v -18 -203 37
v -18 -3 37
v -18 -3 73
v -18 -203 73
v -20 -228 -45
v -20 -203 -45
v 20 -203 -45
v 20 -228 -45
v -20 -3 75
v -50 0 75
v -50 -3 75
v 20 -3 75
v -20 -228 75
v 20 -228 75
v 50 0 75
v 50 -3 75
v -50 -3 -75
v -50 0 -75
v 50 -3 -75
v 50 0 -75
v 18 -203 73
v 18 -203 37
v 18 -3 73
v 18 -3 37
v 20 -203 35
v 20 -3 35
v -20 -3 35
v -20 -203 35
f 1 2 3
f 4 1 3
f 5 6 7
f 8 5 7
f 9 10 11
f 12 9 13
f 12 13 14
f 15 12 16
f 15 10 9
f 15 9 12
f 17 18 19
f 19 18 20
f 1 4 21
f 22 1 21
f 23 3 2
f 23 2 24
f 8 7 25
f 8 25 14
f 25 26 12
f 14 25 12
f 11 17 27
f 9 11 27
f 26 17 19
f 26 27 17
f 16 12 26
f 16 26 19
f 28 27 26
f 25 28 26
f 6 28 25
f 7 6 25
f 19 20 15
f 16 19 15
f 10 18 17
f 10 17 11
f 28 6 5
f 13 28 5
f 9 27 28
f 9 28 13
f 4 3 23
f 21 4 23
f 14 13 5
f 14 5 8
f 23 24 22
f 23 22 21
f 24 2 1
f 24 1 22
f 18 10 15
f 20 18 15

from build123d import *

# Parameters (mm, degrees)
F0_W     = 100
F0_H     = 150
F1_DEPTH = 3
F2_W     = 36
F2_H     = 36
F3_DEPTH = 200
F4_W     = 40
F4_H     = 120
F5_DEPTH = 25


with BuildPart() as f1:
    # F0 (on Front) → F1 (new body)
    with BuildSketch(Plane.XZ):
        Rectangle(F0_W, F0_H)
    extrude(amount=F1_DEPTH)

    # F2 (on face) → F3 (join)
    with BuildSketch(Plane.XZ.offset(3)):
        Polygon((20, 75), (0, 75), (-20, 75), (-20, 35), (20, 35), align=None)
        with Locations((0, 55)):
            Rectangle(F2_W, F2_H, mode=Mode.SUBTRACT)
    extrude(amount=F3_DEPTH)

    # F4 (on face) → F5 (join)
    with BuildSketch(Plane.XZ.offset(203)):
        with Locations((0, 15)):
            Rectangle(F4_W, F4_H)
    extrude(amount=F5_DEPTH)


solid = f1.part
